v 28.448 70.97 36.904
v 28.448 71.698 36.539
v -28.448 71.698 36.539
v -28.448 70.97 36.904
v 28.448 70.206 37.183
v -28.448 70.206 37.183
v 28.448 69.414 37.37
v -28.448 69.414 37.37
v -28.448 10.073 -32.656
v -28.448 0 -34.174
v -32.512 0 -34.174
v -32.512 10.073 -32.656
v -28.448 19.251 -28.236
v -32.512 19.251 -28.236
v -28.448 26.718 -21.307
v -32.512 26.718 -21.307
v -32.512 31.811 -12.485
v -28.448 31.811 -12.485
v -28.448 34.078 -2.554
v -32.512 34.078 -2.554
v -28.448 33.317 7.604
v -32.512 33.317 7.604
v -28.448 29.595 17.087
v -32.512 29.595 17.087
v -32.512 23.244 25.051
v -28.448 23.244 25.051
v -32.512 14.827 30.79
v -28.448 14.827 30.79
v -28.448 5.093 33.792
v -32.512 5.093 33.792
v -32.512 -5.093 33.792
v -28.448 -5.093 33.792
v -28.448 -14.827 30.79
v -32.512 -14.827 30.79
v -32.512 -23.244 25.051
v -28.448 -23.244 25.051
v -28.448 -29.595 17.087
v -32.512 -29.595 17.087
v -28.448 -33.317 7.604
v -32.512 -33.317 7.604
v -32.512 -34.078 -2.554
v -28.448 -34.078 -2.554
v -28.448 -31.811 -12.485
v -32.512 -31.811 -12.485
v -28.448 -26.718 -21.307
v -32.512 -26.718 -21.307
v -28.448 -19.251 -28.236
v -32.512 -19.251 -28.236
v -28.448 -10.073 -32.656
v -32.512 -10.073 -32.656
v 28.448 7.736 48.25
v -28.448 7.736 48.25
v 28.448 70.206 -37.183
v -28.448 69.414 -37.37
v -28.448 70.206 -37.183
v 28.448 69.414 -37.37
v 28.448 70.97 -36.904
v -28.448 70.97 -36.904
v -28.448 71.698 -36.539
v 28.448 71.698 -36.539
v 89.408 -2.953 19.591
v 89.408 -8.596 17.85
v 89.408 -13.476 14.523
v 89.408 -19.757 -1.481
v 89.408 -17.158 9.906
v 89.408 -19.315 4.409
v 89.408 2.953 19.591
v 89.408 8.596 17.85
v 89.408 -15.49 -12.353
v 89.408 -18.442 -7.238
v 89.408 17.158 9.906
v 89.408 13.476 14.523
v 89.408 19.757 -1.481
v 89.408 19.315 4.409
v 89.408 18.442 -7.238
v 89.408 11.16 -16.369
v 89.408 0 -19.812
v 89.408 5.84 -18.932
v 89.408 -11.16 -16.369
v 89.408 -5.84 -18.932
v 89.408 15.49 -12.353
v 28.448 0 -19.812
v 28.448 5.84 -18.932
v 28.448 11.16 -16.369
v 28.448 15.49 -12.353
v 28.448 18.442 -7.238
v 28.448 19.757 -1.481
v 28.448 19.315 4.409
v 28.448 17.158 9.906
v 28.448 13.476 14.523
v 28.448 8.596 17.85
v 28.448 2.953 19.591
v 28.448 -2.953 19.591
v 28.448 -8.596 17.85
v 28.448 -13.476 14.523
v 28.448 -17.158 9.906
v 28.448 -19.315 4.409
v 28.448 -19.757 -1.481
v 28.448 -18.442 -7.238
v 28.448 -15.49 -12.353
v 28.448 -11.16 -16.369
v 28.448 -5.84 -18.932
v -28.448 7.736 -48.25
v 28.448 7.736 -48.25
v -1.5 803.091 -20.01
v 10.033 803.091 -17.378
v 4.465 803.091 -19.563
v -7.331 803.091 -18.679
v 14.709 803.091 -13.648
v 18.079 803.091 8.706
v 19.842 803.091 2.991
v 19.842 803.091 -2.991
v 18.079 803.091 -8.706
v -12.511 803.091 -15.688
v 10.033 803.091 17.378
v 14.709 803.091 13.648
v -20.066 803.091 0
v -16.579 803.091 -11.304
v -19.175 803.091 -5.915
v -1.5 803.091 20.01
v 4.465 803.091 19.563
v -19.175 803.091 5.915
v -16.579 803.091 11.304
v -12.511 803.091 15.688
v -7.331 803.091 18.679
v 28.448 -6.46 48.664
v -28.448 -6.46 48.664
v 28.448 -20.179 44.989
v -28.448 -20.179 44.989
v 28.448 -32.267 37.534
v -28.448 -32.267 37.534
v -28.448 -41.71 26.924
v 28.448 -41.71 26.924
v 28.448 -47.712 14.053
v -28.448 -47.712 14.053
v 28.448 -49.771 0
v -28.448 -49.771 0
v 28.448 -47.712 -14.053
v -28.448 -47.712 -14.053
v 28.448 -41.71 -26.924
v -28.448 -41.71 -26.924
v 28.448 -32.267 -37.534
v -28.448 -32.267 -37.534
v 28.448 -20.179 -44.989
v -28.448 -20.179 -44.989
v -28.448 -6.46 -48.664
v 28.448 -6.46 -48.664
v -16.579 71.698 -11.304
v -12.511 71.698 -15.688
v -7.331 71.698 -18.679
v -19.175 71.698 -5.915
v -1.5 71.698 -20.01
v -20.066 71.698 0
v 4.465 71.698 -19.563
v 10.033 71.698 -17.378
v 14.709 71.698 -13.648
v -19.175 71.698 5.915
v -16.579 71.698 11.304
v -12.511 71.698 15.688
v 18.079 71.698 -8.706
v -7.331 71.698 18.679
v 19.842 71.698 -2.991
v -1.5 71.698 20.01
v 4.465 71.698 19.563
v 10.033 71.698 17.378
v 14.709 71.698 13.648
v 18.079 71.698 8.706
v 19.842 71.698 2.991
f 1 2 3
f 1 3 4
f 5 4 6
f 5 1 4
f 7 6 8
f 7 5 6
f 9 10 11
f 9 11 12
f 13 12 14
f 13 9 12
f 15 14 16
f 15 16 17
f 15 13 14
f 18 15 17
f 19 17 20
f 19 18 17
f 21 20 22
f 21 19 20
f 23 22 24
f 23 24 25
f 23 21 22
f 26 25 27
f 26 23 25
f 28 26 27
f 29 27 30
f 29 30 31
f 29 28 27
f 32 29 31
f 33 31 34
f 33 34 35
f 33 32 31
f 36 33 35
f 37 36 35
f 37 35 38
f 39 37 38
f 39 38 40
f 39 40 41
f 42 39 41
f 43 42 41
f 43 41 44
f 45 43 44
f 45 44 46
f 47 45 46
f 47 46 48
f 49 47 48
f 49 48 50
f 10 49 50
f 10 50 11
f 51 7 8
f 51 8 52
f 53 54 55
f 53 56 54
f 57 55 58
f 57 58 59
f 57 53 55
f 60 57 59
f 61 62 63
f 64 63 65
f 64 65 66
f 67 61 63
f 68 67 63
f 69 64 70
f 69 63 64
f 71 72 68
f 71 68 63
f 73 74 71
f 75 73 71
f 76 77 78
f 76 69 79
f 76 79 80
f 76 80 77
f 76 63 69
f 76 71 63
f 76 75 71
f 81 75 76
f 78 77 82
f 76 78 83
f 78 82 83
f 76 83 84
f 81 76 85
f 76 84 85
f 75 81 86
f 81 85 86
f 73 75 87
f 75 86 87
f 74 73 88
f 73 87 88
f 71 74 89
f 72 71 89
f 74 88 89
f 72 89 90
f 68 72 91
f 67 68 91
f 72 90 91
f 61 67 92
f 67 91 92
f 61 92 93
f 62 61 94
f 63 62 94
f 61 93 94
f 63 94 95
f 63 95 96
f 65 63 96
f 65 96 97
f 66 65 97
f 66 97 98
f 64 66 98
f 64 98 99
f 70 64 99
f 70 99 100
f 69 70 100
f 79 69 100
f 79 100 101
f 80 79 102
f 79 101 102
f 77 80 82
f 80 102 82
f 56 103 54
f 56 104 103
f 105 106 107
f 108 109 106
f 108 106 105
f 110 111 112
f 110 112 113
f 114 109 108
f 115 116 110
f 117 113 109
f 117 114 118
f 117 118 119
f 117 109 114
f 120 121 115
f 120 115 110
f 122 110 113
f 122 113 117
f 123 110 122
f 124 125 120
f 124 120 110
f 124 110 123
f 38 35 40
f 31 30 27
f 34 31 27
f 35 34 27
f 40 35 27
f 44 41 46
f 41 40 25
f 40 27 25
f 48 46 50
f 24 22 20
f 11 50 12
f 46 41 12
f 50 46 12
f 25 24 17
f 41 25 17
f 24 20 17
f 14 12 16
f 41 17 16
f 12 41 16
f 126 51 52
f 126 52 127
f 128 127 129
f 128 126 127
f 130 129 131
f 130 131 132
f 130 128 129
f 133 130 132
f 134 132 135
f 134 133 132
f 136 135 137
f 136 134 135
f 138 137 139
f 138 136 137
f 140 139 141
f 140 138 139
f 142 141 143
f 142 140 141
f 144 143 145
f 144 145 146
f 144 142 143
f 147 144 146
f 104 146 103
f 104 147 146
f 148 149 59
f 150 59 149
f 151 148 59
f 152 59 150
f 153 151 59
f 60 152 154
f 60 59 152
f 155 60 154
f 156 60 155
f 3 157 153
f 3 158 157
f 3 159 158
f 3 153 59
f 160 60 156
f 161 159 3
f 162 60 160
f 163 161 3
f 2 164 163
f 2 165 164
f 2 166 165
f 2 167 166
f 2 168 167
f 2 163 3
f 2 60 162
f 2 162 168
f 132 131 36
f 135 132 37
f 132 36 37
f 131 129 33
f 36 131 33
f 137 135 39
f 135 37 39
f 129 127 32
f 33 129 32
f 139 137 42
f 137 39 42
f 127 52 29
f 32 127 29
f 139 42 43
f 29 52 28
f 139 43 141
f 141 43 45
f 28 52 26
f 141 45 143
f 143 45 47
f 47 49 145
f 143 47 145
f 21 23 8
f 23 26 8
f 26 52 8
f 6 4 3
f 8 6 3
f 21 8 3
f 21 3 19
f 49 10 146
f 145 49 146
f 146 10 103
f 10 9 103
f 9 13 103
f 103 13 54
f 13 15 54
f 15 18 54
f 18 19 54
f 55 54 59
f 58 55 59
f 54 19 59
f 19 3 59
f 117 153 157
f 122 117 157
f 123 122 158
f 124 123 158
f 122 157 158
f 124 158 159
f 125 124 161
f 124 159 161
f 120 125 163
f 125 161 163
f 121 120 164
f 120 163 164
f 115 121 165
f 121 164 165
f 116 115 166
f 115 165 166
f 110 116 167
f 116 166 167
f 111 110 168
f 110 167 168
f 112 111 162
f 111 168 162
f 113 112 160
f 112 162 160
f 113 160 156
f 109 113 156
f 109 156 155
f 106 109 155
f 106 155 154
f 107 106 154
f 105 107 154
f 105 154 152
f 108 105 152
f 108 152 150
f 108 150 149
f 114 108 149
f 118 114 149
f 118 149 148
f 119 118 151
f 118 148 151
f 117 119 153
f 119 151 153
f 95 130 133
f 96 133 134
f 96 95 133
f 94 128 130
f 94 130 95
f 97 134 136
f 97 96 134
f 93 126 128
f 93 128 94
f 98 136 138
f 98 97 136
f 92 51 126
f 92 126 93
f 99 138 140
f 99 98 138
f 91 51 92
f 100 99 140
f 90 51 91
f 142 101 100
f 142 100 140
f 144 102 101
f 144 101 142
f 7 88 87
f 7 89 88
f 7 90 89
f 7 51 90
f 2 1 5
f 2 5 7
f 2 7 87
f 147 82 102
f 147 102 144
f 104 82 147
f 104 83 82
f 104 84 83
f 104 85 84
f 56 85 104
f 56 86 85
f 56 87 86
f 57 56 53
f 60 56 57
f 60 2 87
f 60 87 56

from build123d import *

# Parameters (mm, degrees)
EXTRUDE1_DEPTH      = 28.448
EXTRUDE1_DEPTH_BACK = 28.448
SKETCH7_R           = 20.066
EXTRUDE2_DEPTH      = 731.393
SKETCH8_R           = 34.173782646
EXTRUDE3_DEPTH      = 60.96
SKETCH9_R           = 19.812
EXTRUDE4_DEPTH      = 60.96


with BuildPart() as part:
    # Sketch6 → Extrude1 (new, two sides: drawn at the far end of the back side and taken through both)
    with BuildSketch(Plane(origin=(0, 0, 0), x_dir=(0, 0, -1), z_dir=(1, 0, 0)).offset(-EXTRUDE1_DEPTH_BACK)):
        with BuildLine():
            Line((36.538920518, 71.697598607), (-36.538913711, 71.697596168))
            ThreePointArc((-36.538913711, 71.697596168), (-37.054496025, 70.591976021), (-37.3703, 69.41363444))
            Line((-37.3703, 69.41363444), (-48.25031, 7.73618444))
            ThreePointArc((-48.25031, 7.73618444), (5e-06, -49.77053593), (48.25032, 7.73618444))
            Line((48.25032, 7.73618444), (37.37031, 69.41363444))
            ThreePointArc((37.37031, 69.41363444), (37.054505048, 70.591977567), (36.538920518, 71.697598607))
        make_face()
    extrude(amount=EXTRUDE1_DEPTH + EXTRUDE1_DEPTH_BACK)

    # Sketch7 → Extrude2 (add)
    with BuildSketch(Plane(origin=(0, 71.697597388, 2.392e-06), x_dir=(-1, 0, 0), z_dir=(0, 0.9999999999999996, 3.33665997890797e-08))):
        Circle(SKETCH7_R)
    extrude(amount=EXTRUDE2_DEPTH)

    # Sketch8 → Extrude3 (add)
    with BuildSketch(Plane(origin=(28.448, 0, 0), x_dir=(0, 0, -1), z_dir=(1, 0, 0))):
        Circle(SKETCH8_R)
    extrude(amount=-EXTRUDE3_DEPTH)

    # Sketch9 → Extrude4 (add)
    with BuildSketch(Plane(origin=(28.448, 0, 0), x_dir=(0, 0, -1), z_dir=(1, 0, 0))):
        Circle(SKETCH9_R)
    extrude(amount=EXTRUDE4_DEPTH)


solid = part.part
